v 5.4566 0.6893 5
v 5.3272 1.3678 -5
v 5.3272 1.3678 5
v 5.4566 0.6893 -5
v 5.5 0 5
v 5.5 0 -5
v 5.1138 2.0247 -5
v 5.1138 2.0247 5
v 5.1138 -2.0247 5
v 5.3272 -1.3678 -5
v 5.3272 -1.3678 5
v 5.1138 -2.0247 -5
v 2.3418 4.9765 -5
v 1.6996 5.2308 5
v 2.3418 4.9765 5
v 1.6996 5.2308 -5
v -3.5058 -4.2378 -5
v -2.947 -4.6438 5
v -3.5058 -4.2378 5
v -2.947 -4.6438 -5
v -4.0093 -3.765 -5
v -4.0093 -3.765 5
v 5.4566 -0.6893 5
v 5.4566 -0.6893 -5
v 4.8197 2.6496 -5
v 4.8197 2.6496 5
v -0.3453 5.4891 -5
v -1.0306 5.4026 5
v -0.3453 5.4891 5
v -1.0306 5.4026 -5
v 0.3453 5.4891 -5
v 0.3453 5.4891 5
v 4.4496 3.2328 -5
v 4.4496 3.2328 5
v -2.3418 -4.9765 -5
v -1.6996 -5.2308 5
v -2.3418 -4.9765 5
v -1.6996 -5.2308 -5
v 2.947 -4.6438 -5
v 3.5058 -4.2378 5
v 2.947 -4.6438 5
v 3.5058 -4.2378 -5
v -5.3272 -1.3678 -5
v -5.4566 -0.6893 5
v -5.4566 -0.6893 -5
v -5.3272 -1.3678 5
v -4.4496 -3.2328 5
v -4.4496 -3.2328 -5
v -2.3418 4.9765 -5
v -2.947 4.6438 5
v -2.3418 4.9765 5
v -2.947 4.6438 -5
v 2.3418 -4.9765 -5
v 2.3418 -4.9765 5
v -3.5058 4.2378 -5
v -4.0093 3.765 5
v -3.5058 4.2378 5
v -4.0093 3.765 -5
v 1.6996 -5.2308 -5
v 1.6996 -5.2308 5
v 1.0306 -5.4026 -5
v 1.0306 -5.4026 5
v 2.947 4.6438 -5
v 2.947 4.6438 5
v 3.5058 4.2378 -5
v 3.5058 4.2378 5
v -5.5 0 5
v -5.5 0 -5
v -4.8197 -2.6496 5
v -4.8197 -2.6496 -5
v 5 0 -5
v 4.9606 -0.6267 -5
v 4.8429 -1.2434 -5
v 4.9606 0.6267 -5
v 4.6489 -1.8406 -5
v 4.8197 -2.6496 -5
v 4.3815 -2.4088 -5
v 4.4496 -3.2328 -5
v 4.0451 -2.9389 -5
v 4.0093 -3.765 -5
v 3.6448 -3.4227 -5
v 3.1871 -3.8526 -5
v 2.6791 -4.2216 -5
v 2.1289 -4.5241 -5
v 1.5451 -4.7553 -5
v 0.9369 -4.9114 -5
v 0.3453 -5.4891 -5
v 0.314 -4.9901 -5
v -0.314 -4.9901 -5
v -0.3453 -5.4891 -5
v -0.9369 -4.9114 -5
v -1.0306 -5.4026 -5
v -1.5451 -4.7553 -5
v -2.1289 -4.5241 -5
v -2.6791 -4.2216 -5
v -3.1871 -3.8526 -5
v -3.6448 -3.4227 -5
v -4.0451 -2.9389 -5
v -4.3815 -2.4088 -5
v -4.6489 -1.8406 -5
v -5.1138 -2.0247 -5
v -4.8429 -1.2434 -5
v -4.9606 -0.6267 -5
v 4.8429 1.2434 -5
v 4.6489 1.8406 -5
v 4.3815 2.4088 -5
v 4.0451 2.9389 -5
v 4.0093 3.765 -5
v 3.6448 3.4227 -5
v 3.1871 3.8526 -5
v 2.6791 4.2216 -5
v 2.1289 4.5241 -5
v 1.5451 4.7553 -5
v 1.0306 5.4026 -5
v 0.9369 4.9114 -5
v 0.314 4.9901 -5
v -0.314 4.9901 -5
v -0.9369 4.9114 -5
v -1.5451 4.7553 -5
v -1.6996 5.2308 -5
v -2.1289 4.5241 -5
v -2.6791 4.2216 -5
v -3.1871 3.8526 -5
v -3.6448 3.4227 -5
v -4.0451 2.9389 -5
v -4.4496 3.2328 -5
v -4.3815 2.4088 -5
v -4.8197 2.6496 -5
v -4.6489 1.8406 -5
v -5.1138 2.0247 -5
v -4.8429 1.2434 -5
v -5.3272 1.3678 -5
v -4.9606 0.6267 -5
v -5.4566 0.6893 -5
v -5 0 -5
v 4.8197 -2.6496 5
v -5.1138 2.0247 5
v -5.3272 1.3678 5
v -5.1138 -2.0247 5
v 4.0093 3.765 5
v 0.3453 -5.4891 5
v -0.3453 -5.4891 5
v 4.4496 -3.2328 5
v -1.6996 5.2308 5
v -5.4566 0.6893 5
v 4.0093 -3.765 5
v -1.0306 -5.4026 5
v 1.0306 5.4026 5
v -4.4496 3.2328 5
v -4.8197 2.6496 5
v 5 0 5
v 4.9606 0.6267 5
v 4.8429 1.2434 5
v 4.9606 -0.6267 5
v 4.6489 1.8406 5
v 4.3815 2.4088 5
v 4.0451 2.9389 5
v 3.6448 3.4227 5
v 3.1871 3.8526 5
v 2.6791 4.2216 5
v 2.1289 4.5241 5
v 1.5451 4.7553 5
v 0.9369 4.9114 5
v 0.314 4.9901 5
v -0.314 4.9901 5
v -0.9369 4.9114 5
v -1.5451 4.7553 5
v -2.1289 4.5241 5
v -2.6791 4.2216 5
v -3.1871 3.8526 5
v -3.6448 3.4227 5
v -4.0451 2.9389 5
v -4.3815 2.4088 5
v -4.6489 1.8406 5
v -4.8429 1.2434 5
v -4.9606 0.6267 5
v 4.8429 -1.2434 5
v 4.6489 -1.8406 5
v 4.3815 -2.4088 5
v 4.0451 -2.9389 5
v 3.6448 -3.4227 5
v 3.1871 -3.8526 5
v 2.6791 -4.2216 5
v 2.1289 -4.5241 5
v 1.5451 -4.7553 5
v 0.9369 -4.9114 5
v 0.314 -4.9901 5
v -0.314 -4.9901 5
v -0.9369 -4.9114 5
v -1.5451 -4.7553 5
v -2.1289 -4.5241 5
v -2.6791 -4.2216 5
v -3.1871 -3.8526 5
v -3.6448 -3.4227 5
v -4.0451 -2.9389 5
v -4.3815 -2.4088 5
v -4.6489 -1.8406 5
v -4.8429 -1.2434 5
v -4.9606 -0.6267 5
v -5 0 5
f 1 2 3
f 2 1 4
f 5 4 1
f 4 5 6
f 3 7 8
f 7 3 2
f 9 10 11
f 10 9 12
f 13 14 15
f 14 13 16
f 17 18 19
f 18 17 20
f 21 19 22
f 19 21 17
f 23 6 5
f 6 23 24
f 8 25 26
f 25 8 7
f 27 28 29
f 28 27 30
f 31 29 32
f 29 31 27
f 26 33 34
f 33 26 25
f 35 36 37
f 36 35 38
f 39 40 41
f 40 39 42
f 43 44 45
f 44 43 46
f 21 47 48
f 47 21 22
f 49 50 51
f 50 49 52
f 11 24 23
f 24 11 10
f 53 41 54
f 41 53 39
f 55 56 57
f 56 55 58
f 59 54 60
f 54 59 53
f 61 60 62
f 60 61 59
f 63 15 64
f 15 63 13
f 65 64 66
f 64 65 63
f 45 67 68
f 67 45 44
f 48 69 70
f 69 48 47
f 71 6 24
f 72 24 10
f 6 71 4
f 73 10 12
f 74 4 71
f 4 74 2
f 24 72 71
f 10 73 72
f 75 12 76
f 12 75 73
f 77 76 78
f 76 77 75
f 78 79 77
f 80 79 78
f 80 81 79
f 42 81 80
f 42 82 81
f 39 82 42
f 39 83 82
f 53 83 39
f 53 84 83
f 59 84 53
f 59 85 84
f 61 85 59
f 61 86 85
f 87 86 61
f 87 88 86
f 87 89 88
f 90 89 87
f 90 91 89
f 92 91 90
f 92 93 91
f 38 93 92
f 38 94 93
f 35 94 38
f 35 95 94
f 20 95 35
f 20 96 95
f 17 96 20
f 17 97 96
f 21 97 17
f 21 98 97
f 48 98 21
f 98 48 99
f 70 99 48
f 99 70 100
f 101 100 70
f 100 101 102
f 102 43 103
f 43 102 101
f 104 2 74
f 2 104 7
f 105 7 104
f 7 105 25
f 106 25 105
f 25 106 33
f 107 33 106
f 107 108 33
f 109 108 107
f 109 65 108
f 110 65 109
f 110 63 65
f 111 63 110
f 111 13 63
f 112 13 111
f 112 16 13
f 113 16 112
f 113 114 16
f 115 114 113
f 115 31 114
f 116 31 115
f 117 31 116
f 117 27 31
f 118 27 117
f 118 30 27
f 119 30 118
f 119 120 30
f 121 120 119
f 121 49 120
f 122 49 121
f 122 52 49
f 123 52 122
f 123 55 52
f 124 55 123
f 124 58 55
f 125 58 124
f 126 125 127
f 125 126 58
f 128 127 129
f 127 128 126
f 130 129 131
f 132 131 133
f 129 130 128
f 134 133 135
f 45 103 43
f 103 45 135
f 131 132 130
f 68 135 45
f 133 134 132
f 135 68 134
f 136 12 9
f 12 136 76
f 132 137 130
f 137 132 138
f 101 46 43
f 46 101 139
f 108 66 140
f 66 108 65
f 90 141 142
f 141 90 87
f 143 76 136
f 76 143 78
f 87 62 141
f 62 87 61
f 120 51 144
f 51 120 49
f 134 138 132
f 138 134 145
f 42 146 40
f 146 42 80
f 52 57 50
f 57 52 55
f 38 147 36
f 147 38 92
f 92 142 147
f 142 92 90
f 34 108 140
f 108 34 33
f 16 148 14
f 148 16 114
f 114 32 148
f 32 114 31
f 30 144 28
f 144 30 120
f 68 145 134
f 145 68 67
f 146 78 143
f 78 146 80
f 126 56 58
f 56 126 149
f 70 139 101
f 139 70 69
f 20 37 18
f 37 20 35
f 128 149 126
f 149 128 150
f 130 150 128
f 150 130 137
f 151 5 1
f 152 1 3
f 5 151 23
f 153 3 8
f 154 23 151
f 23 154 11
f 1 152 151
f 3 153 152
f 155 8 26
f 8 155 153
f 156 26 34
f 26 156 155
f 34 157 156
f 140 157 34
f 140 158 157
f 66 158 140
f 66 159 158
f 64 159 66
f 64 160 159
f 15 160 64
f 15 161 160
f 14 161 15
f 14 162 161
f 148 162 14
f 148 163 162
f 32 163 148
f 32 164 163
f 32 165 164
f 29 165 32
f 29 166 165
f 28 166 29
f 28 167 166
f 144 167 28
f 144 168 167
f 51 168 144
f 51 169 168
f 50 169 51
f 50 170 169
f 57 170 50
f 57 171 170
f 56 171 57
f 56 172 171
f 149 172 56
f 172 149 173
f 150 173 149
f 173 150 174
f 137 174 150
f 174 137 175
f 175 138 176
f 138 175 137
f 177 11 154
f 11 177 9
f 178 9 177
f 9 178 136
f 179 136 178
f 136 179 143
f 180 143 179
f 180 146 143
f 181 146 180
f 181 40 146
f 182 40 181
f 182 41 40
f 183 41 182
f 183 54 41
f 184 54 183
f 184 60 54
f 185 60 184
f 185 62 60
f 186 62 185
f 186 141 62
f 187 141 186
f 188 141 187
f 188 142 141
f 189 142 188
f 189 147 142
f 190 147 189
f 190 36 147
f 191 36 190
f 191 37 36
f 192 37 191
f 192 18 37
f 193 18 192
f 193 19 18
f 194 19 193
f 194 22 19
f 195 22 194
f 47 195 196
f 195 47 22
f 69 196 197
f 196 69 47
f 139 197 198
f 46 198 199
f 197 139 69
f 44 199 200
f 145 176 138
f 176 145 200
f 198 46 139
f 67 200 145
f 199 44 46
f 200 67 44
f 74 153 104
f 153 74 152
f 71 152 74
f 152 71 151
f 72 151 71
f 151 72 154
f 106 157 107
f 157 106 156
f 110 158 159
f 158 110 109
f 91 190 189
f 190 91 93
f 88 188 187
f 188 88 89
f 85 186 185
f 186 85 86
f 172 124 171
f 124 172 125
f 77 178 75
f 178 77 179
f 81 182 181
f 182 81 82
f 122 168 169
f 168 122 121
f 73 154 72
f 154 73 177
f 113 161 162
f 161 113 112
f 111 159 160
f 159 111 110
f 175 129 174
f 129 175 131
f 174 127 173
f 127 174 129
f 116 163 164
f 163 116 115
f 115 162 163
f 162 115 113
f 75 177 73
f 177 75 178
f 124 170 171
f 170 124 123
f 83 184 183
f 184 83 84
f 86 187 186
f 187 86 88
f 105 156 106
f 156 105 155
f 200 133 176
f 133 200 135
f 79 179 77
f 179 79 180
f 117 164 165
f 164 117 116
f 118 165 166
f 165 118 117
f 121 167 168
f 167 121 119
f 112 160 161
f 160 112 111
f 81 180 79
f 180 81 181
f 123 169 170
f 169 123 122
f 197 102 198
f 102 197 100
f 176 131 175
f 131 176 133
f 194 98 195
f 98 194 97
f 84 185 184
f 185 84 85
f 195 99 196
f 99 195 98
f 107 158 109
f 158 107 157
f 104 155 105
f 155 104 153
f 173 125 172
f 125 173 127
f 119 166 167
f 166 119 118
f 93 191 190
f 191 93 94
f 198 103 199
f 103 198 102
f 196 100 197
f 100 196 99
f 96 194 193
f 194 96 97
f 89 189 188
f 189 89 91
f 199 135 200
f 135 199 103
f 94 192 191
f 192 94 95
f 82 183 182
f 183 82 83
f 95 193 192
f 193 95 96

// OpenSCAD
$fn = 50;


difference() {
	union() {
		translate(v = [0, 0, -5.0000000000]) {
			cylinder(h = 10, r = 5.5000000000);
		}
	}
	union() {
		translate(v = [0, 0, -100.0000000000]) {
			cylinder(h = 200, r = 5.0000000000);
		}
	}
}
